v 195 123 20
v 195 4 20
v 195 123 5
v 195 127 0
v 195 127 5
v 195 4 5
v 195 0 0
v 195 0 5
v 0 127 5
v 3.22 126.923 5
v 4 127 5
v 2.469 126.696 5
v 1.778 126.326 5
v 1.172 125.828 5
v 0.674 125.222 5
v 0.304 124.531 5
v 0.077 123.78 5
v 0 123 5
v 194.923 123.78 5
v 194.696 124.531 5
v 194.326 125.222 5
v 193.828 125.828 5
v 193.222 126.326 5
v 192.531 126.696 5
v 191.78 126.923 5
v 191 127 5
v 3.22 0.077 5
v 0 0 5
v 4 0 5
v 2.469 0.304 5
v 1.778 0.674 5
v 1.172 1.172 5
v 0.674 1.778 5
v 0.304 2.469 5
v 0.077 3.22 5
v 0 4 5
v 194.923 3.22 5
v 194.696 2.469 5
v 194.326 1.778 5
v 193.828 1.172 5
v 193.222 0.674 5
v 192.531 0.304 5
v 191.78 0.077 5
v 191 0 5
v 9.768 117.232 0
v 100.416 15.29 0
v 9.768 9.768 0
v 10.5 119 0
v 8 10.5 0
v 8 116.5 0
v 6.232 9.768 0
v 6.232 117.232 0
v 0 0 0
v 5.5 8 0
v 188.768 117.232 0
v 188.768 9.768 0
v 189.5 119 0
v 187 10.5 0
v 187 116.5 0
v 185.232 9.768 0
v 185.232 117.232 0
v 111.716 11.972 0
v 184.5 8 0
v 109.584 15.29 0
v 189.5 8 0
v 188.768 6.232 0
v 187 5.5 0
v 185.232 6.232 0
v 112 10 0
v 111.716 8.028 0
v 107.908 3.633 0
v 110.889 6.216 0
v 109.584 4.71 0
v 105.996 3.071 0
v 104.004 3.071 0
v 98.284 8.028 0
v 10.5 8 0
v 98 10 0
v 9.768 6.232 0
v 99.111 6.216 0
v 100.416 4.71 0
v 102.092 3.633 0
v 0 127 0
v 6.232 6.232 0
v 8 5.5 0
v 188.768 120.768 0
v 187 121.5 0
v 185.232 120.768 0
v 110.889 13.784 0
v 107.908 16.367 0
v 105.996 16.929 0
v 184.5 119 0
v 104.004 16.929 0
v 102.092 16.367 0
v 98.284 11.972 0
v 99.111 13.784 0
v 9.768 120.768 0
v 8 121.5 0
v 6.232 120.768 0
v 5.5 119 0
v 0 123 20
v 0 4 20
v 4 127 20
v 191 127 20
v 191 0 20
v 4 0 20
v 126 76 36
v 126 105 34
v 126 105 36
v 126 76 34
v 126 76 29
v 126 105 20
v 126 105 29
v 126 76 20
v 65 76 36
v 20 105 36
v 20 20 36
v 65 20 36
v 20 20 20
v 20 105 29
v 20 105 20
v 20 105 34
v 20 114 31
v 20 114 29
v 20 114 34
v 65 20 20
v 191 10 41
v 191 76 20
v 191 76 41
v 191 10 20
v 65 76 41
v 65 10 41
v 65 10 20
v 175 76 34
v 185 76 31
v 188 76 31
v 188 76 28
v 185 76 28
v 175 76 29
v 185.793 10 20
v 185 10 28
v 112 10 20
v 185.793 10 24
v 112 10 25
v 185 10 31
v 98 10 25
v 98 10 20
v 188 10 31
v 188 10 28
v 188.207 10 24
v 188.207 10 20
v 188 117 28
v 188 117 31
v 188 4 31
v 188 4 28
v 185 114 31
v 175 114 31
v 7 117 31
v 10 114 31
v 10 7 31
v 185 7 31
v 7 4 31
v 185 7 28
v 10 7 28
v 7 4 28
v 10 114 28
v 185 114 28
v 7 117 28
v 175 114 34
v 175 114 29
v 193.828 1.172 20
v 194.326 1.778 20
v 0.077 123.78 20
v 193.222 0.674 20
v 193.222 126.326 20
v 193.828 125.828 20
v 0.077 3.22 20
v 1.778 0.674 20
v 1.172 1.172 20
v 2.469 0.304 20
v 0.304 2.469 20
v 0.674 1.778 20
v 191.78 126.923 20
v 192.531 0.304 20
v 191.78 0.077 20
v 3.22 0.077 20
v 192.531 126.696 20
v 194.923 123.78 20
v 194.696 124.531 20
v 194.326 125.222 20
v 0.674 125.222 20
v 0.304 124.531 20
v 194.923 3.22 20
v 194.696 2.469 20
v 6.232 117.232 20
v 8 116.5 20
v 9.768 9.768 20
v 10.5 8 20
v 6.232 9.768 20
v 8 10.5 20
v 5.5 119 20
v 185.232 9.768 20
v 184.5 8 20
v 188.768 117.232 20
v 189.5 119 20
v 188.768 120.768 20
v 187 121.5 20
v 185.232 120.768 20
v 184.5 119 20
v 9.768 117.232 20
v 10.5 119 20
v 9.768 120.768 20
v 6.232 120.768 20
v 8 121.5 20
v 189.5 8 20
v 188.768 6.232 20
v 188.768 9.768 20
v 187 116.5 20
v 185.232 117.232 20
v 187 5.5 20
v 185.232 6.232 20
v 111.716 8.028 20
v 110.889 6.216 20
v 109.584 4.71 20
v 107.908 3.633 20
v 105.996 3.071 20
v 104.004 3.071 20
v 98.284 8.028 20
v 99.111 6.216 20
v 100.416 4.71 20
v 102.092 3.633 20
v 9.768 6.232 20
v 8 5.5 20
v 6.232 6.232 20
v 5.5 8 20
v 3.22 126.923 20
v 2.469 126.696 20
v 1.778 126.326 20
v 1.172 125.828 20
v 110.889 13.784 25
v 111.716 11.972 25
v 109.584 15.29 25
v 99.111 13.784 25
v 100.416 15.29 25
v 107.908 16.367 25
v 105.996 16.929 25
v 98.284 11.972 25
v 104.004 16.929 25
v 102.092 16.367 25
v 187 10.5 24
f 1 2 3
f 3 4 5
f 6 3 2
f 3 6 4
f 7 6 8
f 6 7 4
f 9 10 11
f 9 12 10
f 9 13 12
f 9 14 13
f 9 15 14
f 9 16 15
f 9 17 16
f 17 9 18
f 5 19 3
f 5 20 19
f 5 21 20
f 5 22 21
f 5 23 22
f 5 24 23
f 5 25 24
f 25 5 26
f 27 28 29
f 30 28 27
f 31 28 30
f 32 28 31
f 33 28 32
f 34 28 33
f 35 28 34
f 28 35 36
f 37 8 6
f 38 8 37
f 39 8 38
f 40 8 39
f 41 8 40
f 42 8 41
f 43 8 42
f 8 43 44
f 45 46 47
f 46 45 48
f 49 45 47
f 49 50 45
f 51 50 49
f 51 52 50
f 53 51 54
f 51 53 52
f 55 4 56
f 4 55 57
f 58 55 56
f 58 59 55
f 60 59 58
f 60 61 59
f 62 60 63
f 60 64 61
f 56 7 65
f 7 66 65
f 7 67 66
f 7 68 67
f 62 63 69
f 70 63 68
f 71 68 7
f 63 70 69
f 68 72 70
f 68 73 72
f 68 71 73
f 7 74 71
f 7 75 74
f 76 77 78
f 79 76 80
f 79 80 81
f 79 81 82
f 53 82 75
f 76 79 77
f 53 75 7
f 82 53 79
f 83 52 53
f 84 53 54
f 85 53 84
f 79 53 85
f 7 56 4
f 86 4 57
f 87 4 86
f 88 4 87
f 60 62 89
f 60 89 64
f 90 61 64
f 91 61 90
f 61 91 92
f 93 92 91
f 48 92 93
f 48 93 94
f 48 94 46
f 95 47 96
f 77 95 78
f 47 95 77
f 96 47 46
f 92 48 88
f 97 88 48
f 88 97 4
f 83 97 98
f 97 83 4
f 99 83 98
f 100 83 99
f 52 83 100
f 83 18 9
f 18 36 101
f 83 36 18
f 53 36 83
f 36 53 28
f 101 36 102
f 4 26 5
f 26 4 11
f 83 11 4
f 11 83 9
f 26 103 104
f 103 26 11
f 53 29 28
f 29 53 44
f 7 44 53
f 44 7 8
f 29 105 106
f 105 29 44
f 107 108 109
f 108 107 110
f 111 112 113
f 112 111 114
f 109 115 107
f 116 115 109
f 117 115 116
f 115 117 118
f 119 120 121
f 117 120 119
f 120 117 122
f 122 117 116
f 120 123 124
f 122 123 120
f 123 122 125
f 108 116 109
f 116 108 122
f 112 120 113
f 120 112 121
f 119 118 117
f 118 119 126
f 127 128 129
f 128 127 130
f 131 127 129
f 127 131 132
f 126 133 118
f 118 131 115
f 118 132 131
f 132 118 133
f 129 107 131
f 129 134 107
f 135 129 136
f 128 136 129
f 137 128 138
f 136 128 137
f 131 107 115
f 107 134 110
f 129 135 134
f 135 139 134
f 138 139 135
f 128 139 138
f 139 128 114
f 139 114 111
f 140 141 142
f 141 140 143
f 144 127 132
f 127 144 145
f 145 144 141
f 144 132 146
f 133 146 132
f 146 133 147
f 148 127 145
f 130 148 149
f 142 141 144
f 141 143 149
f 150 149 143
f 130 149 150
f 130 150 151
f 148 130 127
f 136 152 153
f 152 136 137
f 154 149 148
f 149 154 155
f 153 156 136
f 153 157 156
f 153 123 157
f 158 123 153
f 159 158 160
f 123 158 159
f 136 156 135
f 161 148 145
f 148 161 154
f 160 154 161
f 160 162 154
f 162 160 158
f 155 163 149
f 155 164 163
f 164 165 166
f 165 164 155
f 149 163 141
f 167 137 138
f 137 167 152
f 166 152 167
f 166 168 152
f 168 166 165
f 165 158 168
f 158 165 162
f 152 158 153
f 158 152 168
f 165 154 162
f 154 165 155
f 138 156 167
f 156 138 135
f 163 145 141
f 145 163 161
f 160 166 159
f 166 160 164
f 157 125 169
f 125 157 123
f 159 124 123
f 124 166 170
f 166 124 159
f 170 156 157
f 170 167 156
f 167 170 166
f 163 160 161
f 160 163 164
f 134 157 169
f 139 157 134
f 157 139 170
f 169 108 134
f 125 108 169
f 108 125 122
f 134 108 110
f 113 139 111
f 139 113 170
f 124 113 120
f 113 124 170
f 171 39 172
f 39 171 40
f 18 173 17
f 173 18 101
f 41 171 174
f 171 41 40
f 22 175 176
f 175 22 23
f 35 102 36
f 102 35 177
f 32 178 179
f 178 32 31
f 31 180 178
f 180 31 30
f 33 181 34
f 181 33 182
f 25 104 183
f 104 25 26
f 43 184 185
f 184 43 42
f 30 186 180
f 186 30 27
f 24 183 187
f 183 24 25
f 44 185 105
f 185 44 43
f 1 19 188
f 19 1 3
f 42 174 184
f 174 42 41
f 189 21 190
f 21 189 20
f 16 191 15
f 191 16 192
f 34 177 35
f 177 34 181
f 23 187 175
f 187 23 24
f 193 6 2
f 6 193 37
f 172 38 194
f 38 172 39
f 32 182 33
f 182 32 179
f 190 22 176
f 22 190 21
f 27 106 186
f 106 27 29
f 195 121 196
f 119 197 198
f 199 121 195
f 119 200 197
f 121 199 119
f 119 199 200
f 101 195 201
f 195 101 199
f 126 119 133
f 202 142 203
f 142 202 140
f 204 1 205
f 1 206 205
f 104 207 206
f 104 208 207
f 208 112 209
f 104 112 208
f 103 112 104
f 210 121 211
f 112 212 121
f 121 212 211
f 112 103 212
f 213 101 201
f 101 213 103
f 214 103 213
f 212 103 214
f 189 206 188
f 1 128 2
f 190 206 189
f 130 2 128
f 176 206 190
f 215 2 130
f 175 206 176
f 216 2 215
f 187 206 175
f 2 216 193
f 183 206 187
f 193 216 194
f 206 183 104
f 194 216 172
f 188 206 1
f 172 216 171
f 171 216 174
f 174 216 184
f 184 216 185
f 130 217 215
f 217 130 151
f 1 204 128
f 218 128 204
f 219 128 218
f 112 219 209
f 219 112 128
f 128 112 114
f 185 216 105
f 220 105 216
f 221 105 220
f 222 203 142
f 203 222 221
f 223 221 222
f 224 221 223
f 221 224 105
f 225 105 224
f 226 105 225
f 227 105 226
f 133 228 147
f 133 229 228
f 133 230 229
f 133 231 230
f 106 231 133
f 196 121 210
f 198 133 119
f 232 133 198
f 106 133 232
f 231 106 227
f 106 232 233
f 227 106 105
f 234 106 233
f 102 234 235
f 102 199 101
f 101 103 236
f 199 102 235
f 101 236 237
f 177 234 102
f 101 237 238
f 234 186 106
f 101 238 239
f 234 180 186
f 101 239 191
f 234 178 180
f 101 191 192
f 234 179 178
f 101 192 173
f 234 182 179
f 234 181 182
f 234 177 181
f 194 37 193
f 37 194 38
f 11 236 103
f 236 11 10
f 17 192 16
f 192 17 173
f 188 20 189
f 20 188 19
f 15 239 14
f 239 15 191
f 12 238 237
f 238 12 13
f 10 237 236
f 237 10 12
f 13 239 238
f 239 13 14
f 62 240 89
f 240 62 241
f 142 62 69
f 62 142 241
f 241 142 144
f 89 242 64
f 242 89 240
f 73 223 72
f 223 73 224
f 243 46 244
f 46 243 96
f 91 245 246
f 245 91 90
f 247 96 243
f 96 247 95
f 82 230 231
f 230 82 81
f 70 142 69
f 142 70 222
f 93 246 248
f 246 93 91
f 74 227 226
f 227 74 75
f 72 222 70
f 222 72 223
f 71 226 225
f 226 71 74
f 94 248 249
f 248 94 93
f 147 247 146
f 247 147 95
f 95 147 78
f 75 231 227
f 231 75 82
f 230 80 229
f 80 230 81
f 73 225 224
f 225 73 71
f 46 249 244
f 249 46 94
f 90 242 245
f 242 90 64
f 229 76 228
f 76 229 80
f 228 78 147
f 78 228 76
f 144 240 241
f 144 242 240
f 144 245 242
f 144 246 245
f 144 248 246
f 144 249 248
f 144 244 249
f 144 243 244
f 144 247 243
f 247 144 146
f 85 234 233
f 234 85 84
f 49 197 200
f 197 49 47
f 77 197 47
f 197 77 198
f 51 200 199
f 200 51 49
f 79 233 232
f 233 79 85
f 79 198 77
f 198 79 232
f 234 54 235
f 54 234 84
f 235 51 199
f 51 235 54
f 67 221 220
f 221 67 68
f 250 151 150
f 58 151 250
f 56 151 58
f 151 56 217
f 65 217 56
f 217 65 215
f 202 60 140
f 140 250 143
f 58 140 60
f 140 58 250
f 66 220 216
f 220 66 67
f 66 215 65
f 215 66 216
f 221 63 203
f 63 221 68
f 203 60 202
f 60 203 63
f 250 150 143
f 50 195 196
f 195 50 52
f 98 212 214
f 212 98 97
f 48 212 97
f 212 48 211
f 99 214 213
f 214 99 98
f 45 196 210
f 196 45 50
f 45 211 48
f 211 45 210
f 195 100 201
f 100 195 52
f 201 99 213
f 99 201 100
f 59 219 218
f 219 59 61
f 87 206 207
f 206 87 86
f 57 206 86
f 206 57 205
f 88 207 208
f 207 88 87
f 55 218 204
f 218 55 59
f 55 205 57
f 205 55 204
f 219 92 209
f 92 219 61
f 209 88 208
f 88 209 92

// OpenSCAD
// Compact handheld case (OpenSCAD)
// Usage: open in OpenSCAD, adjust top-level parameters, press F6 to render, then export STL.
// Default units: mm

// === Top-level parameters (adjust to exact parts) ===
orin_len = 100;        // Jetson Orin dev kit board length (X)
orin_wid = 79;         // Jetson Orin dev kit board width (Y)
orin_height = 21;      // total board height (module + thermal) for clearance (Z)
board_clearance = 2;   // gap between board and case bottom

screen_active_w = 155; // active area width of chosen display (7" typical)
screen_active_h = 87;  // active area height of chosen display
screen_bezel = 10;     // bezel on each side beyond active area (adjust for actual monitor)
screen_thick = 12;     // thickness of monitor/thin field monitor

case_wall = 3;         // wall thickness
standoff_dia = 5;      // standoff outer diameter
standoff_h = 6;        // standoff height
screw_hole = 2.5;      // hole diameter for M2.5 screws

battery_len = 120;     // pocket for battery L
battery_wid = 60;      // pocket for battery W
battery_h = 30;        // pocket for battery H
battery_gap = 2;       // gap margin for battery

power_port_pos = [orin_len - 15, -10]; // x,y position for an external DC cutout (relative to board origin)

bezel_clearance = 3;   // gap between screen bezel and case pocket

// === Mounting hole coordinates for Orin dev kit standoffs ===
// Default positions are approximate — replace with measured coordinates from manufacturer PDF.
standoffs = [
    [8, 8],
    [8, orin_wid - 8],
    [orin_len - 8, 8],
    [orin_len - 8, orin_wid - 8]
];

// === Derived dims ===
case_bottom_w = max(orin_len + 40, screen_active_w + 2*screen_bezel + 20);
case_bottom_h = max(orin_wid + 40, screen_active_h + 2*screen_bezel + 20);
case_bottom_thick = case_wall + 2; // floor thickness

// main assembly origin: place board origin at [20, 20] offset inside case
board_origin = [20, 20];

module rounded_box(sz = [100,80,10], r = 3) {
    minkowski() {
        cube([sz[0]-2*r, sz[1]-2*r, sz[2]]);
        translate([r,r,0]) cylinder(r=r, h=sz[2], $fn=32);
    }
}

// === Case bottom (with board pocket & standoffs) ===
module case_bottom() {
    translate([0,0,0]) union() {
        // base plate
        cube([case_bottom_w, case_bottom_h, case_bottom_thick]);
        // inner cavity for board + battery (cut out)
        translate([board_origin[0], board_origin[1], case_bottom_thick])
            cube([orin_len + 2*case_wall, orin_wid + 2*case_wall, orin_height + 10]); // deep pocket
        // battery pocket (cut)
        translate([case_bottom_w - battery_len - 10, 10, case_bottom_thick])
            cube([battery_len + 6, battery_wid + 6, battery_h + 6]);
        // screen recess pocket (top surface recess for screen bezel)
        translate([(case_bottom_w - (screen_active_w + 2*screen_bezel))/2, case_bottom_h - (screen_active_h + 2*screen_bezel) - 10, case_bottom_thick])
            cube([screen_active_w + 2*screen_bezel, screen_active_h + 2*screen_bezel, screen_thick]);
    }
    // add standoffs inside for Orin mounting
    for(i=[0:len(standoffs)-1]) {
        x = board_origin[0] + standoffs[i][0];
        y = board_origin[1] + standoffs[i][1];
        translate([x, y, case_bottom_thick]) cylinder(r=standoff_dia/2, h=standoff_h);
        // screw hole through standoff
        translate([x, y, 0]) cylinder(r=screw_hole/2, h=case_bottom_thick + standoff_h + 1);
    }
}

// === Case top / screen cover (snaps or screws) ===
module case_screen_frame() {
    frame_thick = case_wall;
    frame_w = screen_active_w + 2*screen_bezel + 2*frame_thick;
    frame_h = screen_active_h + 2*screen_bezel + 2*frame_thick;
    // outer frame
    translate([(case_bottom_w - frame_w)/2, case_bottom_h - frame_h - 10, case_bottom_thick + orin_height + 2])
        difference() {
            cube([frame_w, frame_h, frame_thick]);
            translate([frame_thick, frame_thick, 0]) cube([frame_w - 2*frame_thick, frame_h - 2*frame_thick, frame_thick + 1]);
        }
    // cutout for display active area
    translate([(case_bottom_w - screen_active_w)/2, case_bottom_h - (screen_active_h + frame_thick) - 10, case_bottom_thick + orin_height + 3])
        cube([screen_active_w, screen_active_h, frame_thick + 2]);
}

// === ventilation slots ===
module vents() {
    slot_w = 2; slot_h = 20; gap = 3;
    num = floor((case_bottom_w - 40) / (slot_w + gap));
    x0 = 20;
    y0 = case_bottom_h/2 - slot_h/2;
    for(i=[0:num-1]) translate([x0 + i*(slot_w+gap), y0, case_bottom_thick + 2]) cube([slot_w, slot_h, 4]);
}

// === power cutout (circular) ===
module power_cutout() {
    x = power_port_pos[0] + board_origin[0];
    y = power_port_pos[1] + board_origin[1];
    translate([x, y, 0]) cylinder(r=7, h=case_bottom_thick + 20); // 14mm hole
}

// === assemble ===
difference() {
    union() {
        // bottom shell block for printing
        translate([0,0,0]) rounded_box([case_bottom_w, case_bottom_h, case_bottom_thick + 5], 4);
        // internal detailed bottom (subtract to carve pockets)
        translate([0,0,0]) case_bottom();
        // screen frame / bezel (positive part so subtract notches later)
        translate([0,0,0]) case_screen_frame();
        // ventilation
        translate([0,0,0]) vents();
    }
    // cutouts
    power_cutout();
    // outer screw holes for case assembly (4 corners)
    corner_margin = 8;
    translate([corner_margin, corner_margin, -1]) cylinder(r=2.5, h=case_bottom_thick + 20);
    translate([case_bottom_w - corner_margin, corner_margin, -1]) cylinder(r=2.5, h=case_bottom_thick + 20);
    translate([corner_margin, case_bottom_h - corner_margin, -1]) cylinder(r=2.5, h=case_bottom_thick + 20);
    translate([case_bottom_w - corner_margin, case_bottom_h - corner_margin, -1]) cylinder(r=2.5, h=case_bottom_thick + 20);
}
